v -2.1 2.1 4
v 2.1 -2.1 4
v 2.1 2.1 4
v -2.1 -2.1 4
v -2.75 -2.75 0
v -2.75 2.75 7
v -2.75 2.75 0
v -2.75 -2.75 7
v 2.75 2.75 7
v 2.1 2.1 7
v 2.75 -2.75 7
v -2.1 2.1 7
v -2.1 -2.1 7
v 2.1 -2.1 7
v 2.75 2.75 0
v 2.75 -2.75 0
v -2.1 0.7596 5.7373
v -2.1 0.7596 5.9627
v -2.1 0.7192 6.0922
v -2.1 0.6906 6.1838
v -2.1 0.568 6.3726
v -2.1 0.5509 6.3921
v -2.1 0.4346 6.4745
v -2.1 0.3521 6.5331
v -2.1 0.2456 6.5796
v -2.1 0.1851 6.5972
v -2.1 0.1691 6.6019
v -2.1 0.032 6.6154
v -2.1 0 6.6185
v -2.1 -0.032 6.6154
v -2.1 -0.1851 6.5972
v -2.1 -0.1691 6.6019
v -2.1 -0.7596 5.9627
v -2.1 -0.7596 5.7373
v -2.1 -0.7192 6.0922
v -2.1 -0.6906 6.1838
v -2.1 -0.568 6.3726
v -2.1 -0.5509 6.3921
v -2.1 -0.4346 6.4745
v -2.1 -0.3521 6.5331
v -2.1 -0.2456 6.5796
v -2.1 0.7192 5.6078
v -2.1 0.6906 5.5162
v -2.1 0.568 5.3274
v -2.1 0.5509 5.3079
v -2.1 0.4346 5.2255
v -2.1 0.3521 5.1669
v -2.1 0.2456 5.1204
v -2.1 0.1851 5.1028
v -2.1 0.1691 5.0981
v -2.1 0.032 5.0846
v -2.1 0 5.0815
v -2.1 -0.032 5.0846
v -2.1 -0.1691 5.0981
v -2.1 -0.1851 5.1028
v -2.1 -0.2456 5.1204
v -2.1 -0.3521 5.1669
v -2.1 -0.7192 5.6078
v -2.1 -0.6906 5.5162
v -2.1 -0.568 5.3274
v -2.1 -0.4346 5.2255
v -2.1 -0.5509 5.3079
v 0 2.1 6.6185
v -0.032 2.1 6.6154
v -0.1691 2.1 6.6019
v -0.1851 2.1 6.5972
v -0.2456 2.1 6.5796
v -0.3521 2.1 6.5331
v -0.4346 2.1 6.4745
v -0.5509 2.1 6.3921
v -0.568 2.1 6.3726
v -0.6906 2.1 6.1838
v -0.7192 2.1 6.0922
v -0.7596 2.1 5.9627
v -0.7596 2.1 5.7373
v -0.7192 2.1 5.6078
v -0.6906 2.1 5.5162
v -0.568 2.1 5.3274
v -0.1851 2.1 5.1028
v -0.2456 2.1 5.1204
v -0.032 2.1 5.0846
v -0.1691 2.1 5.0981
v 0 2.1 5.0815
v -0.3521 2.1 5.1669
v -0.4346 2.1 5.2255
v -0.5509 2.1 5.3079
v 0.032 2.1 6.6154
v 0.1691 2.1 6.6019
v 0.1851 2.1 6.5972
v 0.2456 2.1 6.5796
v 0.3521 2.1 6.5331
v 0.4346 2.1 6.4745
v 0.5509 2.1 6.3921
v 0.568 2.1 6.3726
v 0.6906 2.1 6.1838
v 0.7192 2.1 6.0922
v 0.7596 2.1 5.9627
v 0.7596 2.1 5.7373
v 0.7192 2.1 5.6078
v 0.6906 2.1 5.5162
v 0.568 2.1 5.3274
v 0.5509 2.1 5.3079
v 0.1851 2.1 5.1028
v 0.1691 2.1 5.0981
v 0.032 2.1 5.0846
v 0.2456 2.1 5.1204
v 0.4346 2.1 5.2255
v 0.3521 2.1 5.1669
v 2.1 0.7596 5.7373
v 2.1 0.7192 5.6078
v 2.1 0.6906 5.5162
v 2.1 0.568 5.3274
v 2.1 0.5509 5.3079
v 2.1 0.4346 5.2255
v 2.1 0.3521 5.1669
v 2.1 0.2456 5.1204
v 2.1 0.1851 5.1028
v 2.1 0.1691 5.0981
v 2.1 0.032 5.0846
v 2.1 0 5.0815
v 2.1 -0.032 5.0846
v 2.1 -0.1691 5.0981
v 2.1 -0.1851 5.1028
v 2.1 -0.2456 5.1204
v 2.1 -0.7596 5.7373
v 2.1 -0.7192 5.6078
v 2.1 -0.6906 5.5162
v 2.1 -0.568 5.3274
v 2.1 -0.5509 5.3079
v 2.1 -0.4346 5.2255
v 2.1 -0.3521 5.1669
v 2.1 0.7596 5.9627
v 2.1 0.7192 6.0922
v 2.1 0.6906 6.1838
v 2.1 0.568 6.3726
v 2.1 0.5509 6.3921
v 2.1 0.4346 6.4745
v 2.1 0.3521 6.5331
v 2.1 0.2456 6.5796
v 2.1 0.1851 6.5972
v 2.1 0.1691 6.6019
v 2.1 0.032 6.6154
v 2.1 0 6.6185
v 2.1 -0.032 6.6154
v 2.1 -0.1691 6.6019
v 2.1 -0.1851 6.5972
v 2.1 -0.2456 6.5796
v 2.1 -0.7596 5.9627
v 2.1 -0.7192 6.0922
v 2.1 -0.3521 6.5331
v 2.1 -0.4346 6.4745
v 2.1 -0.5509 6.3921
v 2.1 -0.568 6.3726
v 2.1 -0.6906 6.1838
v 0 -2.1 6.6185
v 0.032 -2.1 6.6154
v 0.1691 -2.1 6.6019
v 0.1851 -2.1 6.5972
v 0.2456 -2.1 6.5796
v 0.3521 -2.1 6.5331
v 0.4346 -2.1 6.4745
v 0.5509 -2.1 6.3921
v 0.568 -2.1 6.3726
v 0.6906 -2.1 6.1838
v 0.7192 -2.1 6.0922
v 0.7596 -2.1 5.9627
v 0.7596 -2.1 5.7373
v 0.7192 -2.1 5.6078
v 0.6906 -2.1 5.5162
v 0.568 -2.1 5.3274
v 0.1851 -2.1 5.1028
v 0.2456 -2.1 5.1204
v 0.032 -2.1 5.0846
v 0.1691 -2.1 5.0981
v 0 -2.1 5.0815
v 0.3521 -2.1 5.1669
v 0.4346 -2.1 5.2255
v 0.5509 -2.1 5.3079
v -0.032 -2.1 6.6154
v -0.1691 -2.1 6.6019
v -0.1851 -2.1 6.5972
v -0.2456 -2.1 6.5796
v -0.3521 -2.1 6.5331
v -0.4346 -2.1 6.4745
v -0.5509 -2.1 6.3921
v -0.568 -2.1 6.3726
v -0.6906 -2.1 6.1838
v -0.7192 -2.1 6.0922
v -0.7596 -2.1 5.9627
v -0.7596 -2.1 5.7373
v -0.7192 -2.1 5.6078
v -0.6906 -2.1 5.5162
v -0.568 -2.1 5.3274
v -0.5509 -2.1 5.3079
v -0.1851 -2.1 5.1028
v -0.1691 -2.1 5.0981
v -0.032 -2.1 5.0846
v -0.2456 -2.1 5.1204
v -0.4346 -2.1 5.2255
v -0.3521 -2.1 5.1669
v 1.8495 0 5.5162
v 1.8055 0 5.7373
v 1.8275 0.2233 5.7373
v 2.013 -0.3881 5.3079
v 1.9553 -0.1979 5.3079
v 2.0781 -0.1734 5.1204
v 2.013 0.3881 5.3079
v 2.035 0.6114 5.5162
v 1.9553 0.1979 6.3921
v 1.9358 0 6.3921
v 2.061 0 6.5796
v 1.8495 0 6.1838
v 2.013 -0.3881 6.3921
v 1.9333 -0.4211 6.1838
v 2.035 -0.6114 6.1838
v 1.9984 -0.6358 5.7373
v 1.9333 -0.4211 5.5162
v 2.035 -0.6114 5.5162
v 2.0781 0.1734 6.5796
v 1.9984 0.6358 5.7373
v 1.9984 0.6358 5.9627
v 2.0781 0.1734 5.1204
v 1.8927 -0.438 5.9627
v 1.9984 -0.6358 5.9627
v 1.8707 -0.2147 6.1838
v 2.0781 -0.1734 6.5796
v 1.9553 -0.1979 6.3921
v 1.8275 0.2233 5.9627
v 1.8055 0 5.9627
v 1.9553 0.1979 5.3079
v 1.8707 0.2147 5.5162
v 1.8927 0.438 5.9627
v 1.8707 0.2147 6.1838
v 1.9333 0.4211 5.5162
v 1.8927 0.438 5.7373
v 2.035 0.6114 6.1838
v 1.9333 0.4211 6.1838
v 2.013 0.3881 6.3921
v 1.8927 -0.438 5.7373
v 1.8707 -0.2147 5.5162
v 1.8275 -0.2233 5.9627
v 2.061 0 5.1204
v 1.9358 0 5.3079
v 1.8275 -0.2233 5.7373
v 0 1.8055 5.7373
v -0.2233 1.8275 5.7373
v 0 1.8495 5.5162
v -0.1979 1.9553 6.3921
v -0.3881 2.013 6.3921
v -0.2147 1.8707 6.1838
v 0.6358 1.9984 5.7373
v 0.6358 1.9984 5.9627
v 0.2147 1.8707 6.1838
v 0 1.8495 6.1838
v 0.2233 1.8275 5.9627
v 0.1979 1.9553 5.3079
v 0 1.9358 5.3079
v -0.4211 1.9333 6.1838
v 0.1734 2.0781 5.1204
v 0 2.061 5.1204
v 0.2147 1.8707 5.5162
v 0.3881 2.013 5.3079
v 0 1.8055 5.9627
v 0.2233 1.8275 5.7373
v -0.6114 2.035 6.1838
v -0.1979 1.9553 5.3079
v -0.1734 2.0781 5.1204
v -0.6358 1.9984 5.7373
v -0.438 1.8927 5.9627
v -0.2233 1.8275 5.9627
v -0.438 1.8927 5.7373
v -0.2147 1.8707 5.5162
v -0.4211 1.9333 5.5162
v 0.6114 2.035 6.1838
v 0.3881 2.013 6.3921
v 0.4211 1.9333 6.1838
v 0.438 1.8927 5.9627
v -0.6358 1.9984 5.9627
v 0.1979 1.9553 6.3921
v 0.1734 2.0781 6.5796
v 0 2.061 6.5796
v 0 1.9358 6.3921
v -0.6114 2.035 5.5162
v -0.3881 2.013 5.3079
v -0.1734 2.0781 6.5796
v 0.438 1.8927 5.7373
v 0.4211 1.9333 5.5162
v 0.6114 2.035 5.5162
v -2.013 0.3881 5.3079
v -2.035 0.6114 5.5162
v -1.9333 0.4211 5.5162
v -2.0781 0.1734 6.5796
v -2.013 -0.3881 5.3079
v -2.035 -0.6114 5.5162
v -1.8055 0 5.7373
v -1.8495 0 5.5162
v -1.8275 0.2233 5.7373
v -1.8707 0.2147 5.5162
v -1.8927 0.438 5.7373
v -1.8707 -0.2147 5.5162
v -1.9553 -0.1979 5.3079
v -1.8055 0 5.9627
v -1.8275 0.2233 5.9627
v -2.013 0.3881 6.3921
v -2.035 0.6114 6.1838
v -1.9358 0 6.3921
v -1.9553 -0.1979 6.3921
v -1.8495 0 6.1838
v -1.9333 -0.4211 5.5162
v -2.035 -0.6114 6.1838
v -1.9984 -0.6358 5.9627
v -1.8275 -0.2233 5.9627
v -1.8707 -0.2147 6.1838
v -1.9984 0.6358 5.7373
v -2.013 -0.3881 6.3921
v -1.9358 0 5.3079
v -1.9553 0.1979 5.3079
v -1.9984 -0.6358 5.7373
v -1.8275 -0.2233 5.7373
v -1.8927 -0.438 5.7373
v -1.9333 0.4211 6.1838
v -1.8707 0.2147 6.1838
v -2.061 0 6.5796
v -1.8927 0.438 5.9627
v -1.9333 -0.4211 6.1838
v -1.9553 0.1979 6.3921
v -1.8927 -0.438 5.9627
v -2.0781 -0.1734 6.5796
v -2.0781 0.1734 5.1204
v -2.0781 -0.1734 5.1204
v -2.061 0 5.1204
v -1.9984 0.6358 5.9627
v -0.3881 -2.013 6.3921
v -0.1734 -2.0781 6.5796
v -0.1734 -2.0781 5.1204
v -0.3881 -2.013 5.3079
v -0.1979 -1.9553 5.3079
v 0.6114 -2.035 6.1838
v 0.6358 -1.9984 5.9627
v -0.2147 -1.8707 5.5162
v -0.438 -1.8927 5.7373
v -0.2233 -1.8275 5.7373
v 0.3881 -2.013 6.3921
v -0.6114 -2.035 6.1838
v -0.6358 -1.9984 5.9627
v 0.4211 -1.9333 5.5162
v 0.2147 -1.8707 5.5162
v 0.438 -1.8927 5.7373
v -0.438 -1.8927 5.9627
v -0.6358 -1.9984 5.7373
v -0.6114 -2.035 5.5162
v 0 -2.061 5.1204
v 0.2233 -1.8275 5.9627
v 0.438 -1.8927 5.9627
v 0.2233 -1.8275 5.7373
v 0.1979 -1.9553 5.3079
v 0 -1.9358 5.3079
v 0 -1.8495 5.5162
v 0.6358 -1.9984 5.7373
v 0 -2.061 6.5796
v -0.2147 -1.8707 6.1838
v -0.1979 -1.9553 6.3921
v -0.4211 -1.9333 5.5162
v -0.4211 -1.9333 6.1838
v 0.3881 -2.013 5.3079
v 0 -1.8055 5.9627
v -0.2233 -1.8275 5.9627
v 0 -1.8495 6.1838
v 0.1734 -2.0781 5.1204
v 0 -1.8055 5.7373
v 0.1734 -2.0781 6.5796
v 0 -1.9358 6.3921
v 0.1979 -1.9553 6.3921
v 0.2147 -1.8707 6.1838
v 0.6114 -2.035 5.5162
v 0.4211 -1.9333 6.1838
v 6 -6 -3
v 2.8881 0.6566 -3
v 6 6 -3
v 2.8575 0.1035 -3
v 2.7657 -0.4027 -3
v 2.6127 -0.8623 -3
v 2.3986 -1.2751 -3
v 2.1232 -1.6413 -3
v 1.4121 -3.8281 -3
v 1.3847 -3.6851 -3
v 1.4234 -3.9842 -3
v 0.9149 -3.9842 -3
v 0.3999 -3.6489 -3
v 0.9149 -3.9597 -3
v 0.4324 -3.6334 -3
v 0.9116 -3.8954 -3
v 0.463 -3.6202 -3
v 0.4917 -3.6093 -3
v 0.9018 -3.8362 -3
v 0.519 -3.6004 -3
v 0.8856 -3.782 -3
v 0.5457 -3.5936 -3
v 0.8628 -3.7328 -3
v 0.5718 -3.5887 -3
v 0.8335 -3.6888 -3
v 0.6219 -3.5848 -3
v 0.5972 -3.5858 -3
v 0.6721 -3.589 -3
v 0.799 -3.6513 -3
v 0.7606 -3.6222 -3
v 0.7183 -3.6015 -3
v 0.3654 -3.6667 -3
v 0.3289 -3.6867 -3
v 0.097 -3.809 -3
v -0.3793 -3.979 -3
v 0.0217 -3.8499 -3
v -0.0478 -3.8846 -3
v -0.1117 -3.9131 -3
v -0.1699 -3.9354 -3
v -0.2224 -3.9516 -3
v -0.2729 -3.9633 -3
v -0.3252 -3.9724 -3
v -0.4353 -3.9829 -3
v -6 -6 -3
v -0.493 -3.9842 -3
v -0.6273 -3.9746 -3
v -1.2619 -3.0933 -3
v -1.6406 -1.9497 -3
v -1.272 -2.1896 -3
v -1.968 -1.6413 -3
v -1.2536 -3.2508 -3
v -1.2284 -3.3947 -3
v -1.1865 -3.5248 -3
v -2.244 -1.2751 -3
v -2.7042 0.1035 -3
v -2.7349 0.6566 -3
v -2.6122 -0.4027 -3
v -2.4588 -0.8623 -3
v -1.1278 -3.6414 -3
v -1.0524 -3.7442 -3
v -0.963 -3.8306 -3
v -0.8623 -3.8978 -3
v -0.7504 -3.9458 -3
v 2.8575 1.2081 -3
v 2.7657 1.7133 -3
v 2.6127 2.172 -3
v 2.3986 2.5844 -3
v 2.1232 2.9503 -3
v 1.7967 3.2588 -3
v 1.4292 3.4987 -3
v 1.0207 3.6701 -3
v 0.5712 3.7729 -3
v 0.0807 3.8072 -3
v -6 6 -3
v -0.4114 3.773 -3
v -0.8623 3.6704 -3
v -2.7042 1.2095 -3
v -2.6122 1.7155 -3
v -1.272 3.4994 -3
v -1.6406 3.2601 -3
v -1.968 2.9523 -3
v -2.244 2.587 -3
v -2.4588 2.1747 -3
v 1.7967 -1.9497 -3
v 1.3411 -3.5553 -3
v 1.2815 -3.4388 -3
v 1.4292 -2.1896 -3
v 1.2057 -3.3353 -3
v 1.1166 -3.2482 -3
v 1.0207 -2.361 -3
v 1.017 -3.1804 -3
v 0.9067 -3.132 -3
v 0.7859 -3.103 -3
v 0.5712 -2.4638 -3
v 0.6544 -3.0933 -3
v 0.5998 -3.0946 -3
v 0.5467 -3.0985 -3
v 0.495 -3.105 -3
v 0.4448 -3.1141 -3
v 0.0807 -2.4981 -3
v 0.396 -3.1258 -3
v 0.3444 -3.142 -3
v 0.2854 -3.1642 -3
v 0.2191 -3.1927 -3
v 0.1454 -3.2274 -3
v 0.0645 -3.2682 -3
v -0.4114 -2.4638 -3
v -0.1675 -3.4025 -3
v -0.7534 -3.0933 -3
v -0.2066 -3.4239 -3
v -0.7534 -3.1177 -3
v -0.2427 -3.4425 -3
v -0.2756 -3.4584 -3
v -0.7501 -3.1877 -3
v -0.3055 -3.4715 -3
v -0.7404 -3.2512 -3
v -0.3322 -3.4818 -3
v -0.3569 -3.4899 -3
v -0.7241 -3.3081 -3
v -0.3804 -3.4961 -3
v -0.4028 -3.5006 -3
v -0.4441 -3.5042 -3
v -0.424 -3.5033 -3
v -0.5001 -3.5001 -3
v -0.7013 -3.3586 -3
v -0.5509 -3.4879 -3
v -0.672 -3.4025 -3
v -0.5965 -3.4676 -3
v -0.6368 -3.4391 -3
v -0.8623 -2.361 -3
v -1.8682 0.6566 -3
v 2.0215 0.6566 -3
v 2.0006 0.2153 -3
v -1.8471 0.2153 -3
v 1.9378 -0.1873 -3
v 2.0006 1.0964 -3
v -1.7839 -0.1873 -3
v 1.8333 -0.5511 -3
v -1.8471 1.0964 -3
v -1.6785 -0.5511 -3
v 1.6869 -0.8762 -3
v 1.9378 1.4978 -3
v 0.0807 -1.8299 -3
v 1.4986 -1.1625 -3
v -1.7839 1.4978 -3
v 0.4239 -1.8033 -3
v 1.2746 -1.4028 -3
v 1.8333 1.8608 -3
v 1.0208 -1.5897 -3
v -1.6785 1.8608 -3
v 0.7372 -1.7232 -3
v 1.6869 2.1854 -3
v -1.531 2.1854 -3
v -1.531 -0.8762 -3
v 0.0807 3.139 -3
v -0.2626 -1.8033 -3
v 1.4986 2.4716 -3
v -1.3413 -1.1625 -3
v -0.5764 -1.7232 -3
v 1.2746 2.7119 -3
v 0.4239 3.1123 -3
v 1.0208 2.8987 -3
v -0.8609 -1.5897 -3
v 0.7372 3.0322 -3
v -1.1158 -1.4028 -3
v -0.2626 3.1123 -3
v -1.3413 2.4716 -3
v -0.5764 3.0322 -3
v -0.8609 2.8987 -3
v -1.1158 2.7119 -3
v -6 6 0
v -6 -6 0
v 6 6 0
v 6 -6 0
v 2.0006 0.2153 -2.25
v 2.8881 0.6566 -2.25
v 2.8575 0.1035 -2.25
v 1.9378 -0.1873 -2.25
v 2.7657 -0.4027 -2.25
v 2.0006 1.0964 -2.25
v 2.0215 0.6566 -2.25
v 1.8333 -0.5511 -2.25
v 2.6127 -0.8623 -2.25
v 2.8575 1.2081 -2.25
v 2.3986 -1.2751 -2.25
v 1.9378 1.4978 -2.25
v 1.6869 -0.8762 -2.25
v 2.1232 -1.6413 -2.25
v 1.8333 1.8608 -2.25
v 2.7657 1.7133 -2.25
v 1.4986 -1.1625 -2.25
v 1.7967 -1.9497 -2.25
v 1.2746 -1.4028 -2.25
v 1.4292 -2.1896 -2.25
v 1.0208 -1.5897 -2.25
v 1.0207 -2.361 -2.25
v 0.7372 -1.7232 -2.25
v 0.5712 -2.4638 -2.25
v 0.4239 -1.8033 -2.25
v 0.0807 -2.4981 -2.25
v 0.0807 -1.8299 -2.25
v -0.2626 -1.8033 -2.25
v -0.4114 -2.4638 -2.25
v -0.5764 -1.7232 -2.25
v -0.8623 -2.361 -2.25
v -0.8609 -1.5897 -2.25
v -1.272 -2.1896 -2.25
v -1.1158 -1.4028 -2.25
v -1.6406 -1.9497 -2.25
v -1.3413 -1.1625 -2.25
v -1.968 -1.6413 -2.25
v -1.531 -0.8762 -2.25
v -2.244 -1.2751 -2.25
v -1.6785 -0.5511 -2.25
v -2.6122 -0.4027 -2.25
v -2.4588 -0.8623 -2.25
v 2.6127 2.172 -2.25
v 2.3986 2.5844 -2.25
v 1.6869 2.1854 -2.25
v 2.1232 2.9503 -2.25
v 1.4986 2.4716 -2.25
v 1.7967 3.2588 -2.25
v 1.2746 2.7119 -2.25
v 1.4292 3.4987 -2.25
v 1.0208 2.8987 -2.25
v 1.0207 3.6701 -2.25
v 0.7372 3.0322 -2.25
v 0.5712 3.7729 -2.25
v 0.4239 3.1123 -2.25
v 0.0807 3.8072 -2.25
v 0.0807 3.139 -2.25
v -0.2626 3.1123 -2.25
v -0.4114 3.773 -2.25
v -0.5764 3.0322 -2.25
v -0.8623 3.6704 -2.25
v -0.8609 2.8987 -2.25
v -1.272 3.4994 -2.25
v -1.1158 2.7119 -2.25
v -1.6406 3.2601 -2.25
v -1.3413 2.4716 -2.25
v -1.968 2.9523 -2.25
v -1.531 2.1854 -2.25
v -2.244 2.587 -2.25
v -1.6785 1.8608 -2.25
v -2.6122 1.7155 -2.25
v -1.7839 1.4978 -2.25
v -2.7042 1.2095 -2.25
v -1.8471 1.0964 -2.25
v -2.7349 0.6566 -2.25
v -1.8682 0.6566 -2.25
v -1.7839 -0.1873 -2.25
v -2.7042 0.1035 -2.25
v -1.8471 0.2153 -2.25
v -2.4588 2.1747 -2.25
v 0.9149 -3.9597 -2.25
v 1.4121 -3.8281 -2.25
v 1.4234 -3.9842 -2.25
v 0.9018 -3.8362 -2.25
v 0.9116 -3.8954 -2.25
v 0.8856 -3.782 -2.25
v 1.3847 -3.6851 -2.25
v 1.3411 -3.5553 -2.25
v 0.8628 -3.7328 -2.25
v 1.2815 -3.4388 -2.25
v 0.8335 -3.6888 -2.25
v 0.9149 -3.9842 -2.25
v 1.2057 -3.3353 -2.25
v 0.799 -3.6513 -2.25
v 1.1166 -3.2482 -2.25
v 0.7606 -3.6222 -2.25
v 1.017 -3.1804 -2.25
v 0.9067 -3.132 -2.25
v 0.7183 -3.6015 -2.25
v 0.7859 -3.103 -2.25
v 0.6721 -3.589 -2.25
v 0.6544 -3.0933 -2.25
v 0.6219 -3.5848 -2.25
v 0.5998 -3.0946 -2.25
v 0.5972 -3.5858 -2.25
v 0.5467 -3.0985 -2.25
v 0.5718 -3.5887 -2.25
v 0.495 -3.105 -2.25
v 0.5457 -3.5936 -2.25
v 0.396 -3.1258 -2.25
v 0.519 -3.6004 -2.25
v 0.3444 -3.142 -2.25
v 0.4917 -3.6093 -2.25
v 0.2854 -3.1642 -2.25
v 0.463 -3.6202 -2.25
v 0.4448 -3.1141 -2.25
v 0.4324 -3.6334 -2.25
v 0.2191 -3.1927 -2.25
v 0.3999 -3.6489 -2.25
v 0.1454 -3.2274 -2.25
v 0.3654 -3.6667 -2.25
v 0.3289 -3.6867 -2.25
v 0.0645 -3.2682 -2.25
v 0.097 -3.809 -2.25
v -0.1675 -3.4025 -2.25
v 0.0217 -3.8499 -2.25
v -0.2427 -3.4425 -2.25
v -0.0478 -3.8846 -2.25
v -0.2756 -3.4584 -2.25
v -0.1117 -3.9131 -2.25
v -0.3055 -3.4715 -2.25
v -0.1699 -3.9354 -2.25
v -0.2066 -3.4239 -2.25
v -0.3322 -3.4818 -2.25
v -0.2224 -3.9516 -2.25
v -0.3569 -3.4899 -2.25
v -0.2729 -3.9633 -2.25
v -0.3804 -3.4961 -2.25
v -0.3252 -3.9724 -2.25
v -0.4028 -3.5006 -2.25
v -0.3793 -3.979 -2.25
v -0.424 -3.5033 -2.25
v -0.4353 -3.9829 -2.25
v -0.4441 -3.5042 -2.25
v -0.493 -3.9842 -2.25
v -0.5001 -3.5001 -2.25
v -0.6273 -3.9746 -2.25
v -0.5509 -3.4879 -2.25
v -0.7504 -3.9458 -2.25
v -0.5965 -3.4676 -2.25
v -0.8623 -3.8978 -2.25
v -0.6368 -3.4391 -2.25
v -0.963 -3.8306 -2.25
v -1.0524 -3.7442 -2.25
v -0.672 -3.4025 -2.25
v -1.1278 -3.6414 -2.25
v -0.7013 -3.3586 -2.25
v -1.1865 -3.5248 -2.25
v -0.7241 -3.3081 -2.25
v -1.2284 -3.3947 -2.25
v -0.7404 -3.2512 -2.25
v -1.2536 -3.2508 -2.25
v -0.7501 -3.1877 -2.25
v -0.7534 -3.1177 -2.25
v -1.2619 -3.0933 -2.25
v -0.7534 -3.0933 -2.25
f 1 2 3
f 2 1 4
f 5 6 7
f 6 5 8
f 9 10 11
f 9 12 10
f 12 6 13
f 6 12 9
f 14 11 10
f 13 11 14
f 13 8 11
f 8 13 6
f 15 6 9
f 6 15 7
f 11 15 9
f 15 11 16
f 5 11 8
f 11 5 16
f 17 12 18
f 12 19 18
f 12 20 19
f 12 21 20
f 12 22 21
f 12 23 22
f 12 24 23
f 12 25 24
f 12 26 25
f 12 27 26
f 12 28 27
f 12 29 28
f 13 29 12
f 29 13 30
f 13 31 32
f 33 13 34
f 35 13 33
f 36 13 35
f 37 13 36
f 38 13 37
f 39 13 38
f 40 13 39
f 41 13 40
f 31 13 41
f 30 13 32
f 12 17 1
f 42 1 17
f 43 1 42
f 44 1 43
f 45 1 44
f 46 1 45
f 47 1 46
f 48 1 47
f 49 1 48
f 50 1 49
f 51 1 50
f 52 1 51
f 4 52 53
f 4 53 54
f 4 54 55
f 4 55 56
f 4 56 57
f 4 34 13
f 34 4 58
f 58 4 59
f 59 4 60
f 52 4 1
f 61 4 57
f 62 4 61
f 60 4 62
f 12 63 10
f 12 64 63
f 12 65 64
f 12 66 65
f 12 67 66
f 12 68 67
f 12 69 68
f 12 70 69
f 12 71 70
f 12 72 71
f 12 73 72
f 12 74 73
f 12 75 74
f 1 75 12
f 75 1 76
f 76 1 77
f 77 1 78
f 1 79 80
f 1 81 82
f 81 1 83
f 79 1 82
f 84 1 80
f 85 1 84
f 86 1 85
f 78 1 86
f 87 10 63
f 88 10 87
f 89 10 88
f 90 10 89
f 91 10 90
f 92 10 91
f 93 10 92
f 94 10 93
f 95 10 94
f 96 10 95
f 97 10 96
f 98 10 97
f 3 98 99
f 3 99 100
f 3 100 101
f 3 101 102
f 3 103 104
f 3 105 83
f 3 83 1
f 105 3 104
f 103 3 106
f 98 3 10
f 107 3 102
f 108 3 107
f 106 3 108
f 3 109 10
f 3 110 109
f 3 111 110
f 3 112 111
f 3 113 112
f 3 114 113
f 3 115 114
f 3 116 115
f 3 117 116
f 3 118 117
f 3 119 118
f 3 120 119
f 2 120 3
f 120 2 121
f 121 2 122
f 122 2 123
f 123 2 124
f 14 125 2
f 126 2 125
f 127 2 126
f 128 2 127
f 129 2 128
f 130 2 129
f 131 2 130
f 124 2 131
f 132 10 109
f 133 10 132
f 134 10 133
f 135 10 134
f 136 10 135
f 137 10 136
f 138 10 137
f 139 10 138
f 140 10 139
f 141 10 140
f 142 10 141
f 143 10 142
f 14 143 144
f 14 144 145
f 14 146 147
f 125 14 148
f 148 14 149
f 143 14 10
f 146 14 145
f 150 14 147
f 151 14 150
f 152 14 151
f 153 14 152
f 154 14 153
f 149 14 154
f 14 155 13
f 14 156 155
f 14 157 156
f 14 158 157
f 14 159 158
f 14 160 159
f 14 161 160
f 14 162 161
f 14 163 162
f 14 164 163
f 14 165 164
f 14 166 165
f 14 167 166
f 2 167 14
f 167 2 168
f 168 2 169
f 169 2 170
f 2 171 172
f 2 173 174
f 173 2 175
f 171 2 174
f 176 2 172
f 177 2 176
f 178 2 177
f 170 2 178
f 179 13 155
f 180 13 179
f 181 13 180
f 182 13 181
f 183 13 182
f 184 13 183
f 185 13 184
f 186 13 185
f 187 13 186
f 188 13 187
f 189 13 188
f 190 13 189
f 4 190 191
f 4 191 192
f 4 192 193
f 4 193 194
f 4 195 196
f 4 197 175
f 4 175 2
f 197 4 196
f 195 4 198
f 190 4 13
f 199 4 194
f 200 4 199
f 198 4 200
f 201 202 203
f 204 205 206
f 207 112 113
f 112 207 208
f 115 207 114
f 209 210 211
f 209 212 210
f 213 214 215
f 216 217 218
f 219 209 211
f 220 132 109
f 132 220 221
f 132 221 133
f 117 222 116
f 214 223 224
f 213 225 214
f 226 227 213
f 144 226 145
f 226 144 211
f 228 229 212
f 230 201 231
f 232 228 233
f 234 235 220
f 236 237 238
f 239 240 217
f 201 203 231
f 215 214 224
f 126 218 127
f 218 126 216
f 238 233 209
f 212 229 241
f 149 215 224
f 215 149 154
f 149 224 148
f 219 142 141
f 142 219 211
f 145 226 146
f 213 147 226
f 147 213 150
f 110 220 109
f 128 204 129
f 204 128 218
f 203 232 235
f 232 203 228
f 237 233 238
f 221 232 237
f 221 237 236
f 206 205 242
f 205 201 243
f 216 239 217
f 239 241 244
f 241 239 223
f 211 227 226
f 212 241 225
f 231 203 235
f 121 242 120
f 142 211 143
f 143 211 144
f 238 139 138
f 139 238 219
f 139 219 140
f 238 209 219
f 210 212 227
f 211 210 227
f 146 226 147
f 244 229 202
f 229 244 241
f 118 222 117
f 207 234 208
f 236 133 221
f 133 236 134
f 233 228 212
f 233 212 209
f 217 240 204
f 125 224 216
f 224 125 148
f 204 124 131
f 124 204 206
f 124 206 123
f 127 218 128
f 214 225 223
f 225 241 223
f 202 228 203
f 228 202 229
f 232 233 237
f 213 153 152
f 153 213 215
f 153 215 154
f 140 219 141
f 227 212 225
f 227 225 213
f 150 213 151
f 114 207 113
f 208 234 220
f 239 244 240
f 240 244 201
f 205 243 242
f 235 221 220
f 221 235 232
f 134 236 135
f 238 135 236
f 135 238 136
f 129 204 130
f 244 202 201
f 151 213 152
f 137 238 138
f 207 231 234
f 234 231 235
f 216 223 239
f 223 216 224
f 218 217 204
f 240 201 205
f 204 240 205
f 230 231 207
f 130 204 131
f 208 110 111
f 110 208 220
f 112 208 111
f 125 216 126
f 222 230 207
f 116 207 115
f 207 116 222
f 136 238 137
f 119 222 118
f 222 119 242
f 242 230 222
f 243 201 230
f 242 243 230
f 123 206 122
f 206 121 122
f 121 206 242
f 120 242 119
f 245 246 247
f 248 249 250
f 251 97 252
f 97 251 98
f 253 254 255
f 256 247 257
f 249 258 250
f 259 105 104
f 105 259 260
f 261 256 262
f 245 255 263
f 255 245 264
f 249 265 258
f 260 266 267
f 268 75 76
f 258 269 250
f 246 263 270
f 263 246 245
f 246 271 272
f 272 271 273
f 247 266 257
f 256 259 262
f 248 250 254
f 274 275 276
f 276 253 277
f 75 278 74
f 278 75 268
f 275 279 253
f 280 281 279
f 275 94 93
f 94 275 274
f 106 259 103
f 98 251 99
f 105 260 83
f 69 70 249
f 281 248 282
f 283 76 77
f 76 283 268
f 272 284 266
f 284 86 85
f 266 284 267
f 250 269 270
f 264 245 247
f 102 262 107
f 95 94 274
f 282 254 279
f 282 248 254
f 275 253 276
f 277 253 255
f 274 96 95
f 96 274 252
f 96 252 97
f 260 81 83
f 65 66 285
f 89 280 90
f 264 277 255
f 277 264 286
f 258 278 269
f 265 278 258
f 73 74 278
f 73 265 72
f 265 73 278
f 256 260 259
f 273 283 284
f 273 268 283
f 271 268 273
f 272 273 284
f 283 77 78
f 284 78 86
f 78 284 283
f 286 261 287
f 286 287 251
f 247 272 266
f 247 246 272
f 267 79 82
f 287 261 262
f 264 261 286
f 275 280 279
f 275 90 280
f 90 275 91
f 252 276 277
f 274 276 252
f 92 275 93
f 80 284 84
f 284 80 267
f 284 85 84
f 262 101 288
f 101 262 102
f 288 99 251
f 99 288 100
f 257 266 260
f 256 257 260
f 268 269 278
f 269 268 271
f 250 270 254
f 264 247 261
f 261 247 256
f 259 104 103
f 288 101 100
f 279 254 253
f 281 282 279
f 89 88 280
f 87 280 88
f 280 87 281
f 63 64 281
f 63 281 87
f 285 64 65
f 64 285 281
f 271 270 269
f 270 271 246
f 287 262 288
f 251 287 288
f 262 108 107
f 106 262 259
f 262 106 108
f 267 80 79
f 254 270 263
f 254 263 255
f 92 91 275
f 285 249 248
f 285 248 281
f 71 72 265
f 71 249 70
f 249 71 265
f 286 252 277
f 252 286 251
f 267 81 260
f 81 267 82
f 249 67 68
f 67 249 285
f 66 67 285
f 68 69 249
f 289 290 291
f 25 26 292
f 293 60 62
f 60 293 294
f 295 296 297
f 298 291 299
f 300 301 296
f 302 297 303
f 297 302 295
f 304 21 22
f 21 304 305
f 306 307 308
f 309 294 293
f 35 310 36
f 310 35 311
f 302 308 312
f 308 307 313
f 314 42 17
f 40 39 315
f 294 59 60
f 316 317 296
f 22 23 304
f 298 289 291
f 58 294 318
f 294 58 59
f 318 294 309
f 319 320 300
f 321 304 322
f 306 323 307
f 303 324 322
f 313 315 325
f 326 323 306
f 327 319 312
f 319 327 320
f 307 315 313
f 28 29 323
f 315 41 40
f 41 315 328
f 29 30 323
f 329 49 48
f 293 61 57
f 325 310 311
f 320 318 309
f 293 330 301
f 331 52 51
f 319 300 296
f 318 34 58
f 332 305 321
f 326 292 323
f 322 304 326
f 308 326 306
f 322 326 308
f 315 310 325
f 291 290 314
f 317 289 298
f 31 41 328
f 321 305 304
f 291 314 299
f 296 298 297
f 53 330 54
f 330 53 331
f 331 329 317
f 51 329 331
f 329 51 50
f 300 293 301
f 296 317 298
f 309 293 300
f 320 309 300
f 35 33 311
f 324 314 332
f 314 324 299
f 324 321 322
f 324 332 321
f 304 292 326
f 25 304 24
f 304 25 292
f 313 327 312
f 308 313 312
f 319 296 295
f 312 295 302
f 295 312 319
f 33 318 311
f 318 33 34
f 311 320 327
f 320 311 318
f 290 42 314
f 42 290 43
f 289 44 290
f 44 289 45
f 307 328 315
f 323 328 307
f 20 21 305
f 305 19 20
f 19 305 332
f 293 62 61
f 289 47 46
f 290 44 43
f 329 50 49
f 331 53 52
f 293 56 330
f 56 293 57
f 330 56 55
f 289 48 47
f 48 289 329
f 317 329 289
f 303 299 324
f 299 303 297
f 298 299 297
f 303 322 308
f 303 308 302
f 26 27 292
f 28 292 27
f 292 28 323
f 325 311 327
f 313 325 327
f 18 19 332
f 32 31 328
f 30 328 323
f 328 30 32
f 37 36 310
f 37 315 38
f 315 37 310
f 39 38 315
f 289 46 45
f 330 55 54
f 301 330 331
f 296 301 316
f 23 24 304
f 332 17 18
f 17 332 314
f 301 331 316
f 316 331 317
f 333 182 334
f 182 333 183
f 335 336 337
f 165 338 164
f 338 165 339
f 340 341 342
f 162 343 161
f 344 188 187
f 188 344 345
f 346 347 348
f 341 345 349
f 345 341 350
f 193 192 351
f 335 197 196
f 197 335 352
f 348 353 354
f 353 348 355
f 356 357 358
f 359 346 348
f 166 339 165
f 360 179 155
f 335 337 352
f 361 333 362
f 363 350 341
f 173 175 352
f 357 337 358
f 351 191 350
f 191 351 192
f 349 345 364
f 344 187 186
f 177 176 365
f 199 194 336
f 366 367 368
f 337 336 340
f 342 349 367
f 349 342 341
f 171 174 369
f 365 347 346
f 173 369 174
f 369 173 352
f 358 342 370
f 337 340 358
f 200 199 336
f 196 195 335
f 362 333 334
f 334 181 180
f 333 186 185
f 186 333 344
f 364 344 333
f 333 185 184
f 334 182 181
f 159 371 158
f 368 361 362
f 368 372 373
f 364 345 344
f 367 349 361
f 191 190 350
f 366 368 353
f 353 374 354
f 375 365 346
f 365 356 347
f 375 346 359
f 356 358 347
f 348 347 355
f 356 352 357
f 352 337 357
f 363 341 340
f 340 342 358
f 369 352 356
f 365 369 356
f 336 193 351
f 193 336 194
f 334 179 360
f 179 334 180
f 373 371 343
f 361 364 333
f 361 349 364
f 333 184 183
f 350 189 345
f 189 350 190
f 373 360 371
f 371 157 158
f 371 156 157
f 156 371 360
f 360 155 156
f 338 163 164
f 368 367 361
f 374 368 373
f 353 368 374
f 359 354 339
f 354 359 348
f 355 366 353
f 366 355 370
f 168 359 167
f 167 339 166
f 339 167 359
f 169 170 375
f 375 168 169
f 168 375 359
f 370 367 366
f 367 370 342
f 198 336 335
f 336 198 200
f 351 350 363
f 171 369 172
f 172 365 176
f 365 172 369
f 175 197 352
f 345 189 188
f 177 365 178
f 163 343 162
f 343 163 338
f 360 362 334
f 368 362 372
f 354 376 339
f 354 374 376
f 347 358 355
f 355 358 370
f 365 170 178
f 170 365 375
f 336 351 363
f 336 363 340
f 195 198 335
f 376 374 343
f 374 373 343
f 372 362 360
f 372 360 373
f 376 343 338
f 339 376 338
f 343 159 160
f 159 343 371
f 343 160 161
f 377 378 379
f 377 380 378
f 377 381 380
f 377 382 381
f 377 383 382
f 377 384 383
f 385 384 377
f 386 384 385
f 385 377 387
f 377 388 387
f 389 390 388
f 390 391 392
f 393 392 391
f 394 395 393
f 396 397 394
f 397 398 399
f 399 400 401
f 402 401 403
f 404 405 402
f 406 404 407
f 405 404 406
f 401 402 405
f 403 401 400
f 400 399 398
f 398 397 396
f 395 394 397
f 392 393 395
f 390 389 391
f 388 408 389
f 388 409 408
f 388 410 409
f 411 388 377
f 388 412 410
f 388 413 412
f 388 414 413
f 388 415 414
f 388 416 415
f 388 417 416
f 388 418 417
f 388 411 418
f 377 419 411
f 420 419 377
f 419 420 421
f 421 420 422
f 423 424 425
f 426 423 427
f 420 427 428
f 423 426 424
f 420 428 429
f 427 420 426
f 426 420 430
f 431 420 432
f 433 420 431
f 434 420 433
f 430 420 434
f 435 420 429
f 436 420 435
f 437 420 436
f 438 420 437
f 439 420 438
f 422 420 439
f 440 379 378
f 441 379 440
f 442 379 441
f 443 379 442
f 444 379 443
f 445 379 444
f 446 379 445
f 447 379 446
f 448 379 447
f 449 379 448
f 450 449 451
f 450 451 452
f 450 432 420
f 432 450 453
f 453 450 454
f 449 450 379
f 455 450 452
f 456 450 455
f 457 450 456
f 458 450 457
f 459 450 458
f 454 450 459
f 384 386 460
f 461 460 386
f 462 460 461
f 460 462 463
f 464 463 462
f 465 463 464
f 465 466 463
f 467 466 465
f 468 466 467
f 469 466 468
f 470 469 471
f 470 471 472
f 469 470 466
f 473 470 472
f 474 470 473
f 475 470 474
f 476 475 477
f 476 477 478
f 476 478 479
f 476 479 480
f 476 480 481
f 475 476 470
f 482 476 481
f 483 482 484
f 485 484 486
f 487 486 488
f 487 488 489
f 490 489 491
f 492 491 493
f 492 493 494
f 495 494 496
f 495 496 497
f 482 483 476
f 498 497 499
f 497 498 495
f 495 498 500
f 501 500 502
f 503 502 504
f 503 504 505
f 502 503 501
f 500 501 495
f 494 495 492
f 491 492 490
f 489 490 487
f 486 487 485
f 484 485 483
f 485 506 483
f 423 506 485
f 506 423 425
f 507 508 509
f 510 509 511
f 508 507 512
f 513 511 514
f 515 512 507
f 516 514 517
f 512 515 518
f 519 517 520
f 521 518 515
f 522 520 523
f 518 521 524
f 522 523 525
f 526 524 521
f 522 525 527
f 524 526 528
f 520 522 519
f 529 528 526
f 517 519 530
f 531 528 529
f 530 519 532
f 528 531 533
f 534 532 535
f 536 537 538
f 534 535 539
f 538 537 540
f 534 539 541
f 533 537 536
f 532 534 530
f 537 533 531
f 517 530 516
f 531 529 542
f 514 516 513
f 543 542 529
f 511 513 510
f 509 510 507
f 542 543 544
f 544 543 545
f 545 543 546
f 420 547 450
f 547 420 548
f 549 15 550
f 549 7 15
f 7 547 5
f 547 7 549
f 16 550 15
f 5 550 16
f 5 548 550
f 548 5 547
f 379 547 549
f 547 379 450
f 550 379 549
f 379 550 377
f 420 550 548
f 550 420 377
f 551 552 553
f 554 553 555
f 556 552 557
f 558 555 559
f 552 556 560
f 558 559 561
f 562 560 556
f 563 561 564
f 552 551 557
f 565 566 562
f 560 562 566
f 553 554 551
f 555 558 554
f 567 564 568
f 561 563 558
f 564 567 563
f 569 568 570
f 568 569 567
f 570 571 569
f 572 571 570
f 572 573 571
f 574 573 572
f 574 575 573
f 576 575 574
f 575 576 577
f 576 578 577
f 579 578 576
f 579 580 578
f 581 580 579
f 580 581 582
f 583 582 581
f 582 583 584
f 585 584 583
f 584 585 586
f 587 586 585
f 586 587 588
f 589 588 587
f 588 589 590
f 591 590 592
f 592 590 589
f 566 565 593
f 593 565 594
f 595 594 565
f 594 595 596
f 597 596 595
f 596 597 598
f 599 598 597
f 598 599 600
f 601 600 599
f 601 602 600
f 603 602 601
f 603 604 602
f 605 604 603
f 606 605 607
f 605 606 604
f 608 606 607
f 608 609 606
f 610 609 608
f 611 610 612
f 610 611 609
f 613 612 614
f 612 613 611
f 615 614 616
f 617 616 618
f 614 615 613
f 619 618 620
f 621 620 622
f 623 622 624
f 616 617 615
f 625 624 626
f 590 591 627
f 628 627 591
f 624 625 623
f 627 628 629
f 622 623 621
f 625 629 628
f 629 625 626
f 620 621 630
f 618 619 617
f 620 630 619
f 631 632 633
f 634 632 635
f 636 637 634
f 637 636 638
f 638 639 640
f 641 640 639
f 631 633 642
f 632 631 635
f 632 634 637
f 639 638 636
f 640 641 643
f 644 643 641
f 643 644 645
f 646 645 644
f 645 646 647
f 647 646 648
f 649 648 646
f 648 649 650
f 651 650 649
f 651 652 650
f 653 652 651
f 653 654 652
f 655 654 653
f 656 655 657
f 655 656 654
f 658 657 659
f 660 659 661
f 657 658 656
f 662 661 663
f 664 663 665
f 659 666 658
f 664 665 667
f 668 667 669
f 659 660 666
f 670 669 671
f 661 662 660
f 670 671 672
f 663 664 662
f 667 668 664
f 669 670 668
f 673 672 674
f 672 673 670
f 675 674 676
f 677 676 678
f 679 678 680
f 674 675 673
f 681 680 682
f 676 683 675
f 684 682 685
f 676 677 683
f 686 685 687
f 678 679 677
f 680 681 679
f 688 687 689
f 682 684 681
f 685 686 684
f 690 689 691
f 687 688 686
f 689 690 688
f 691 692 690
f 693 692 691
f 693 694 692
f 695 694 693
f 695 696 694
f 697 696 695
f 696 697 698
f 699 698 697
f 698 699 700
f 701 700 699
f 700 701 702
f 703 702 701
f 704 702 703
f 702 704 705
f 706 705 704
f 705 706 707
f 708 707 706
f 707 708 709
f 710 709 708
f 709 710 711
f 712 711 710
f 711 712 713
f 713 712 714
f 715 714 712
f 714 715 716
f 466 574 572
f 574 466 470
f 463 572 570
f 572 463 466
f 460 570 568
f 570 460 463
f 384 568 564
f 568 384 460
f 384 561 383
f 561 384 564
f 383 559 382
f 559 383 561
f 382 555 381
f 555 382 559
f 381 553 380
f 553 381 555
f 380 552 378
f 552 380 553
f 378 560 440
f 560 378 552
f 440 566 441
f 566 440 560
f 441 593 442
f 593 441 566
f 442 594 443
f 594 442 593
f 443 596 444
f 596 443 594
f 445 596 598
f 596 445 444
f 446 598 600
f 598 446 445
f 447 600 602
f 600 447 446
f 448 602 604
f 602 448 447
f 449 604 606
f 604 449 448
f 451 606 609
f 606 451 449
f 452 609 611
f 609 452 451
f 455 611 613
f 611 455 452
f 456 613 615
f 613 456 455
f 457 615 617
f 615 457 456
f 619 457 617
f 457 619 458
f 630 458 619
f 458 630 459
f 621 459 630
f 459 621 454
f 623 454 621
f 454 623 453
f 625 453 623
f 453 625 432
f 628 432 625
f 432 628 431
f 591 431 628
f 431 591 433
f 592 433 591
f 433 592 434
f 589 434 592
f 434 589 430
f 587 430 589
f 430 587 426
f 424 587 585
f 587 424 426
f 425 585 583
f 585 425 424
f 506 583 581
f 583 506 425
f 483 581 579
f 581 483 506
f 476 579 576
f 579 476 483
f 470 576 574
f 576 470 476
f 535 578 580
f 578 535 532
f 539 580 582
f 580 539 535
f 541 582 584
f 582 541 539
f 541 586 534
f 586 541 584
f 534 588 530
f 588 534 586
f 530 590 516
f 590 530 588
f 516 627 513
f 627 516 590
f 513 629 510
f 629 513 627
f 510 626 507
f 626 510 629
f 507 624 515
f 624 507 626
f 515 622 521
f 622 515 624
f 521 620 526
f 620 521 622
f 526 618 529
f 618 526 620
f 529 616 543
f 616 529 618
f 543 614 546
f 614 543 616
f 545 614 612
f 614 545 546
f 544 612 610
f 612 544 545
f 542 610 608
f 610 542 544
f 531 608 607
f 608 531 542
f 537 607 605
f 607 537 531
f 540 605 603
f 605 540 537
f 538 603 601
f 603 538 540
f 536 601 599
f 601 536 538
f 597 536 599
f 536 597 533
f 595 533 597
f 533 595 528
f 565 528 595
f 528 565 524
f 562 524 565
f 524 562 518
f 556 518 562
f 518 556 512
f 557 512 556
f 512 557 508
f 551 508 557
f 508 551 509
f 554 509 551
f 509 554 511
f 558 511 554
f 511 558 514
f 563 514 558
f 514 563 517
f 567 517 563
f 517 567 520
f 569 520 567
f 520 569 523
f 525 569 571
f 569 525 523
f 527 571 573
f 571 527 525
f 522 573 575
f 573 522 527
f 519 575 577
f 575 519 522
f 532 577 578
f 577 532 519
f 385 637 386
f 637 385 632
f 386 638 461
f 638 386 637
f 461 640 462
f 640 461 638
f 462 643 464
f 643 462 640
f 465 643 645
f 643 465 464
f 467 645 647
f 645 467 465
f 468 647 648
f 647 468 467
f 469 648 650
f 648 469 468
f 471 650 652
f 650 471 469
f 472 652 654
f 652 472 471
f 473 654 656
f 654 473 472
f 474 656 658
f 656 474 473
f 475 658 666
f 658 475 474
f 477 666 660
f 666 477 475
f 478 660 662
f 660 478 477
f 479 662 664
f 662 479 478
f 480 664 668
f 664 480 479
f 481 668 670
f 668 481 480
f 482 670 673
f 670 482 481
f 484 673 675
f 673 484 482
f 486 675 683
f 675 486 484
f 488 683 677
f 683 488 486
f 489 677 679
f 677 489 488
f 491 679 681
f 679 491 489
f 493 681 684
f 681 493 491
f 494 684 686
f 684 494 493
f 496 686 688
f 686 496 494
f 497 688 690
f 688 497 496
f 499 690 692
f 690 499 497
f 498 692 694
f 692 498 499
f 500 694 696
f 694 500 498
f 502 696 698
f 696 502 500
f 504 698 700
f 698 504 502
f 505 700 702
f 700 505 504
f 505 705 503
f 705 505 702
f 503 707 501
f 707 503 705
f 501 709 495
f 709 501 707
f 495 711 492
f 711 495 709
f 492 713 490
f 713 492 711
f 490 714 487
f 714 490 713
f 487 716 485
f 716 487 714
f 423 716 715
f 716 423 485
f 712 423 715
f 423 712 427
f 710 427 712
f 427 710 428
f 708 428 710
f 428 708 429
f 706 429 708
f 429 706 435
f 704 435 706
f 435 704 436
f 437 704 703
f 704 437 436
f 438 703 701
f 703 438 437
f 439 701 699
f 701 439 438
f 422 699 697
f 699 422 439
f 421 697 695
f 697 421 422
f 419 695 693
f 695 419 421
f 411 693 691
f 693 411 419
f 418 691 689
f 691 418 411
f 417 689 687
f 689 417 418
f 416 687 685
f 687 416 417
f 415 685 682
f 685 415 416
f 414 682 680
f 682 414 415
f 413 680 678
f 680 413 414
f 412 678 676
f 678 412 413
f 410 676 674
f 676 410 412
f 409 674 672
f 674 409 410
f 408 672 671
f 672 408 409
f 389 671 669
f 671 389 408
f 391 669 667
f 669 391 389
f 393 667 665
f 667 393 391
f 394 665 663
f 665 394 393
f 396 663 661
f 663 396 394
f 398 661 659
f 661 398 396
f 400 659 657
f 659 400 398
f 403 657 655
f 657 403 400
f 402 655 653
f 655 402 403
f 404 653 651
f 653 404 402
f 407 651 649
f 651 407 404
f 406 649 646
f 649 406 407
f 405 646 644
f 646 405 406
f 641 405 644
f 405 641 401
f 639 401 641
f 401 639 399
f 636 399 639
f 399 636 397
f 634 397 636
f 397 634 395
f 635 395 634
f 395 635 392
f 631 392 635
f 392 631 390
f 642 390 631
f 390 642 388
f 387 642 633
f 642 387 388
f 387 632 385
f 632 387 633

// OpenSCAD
$fn = 32;

Label = "Õ";
TextSize = 6;

module Clip(StemOuter, StemInter, ClipHeight) {
    union() {
        difference() {
            linear_extrude(ClipHeight)
                square(StemOuter, center=true);
            linear_extrude(ClipHeight)
                square(StemInter, center=true);
        }
        
        intersection() {
            union() {
                ClipDepth = 0.3;
                IndentHeight = 1;
                BallRadius = (IndentHeight ^ 2) + (ClipDepth / 2);
                BallOffset = (StemInter / 2) + (BallRadius - ClipDepth);
                BallHeight = ClipHeight - BallRadius;
                translate([BallOffset, 0, BallHeight])
                    sphere(BallRadius);
                translate([0, BallOffset, BallHeight])
                    sphere(BallRadius);
                translate([-BallOffset, 0, BallHeight])
                    sphere(BallRadius);
                translate([0, -BallOffset, BallHeight])
                    sphere(BallRadius);
            }
            
            linear_extrude(ClipHeight)
                square(StemInter, center=true);
        }
    }
}

module ButtonBase(ButtonWidth, ButtonThickness, StemLength) {
    union() {
        translate([0, 0, -ButtonThickness])
            linear_extrude(ButtonThickness)
                square(ButtonWidth, center=true);

        StemOuter = 5.5;
        StemInter = 4.2;
        ClipHeight = 3;
        linear_extrude(StemLength - ClipHeight)
            square(StemOuter, center=true);
        translate([0, 0, StemLength - ClipHeight])
            Clip(StemOuter, StemInter, ClipHeight);
    }
}

module Button(Label, TextSize) {
    ButtonWidth = 12;
    ButtonThickness = 3;
    StemLength = 7;

    difference() {
        ButtonBase(ButtonWidth, ButtonThickness, StemLength);

        translate([0, 0, -ButtonThickness])
            linear_extrude(ButtonThickness/4)
                mirror([0, 1, 0])
                    text(Label, size=TextSize, halign="center", valign="center", font="Wingdings");
    }
}
Button(Label, TextSize);
